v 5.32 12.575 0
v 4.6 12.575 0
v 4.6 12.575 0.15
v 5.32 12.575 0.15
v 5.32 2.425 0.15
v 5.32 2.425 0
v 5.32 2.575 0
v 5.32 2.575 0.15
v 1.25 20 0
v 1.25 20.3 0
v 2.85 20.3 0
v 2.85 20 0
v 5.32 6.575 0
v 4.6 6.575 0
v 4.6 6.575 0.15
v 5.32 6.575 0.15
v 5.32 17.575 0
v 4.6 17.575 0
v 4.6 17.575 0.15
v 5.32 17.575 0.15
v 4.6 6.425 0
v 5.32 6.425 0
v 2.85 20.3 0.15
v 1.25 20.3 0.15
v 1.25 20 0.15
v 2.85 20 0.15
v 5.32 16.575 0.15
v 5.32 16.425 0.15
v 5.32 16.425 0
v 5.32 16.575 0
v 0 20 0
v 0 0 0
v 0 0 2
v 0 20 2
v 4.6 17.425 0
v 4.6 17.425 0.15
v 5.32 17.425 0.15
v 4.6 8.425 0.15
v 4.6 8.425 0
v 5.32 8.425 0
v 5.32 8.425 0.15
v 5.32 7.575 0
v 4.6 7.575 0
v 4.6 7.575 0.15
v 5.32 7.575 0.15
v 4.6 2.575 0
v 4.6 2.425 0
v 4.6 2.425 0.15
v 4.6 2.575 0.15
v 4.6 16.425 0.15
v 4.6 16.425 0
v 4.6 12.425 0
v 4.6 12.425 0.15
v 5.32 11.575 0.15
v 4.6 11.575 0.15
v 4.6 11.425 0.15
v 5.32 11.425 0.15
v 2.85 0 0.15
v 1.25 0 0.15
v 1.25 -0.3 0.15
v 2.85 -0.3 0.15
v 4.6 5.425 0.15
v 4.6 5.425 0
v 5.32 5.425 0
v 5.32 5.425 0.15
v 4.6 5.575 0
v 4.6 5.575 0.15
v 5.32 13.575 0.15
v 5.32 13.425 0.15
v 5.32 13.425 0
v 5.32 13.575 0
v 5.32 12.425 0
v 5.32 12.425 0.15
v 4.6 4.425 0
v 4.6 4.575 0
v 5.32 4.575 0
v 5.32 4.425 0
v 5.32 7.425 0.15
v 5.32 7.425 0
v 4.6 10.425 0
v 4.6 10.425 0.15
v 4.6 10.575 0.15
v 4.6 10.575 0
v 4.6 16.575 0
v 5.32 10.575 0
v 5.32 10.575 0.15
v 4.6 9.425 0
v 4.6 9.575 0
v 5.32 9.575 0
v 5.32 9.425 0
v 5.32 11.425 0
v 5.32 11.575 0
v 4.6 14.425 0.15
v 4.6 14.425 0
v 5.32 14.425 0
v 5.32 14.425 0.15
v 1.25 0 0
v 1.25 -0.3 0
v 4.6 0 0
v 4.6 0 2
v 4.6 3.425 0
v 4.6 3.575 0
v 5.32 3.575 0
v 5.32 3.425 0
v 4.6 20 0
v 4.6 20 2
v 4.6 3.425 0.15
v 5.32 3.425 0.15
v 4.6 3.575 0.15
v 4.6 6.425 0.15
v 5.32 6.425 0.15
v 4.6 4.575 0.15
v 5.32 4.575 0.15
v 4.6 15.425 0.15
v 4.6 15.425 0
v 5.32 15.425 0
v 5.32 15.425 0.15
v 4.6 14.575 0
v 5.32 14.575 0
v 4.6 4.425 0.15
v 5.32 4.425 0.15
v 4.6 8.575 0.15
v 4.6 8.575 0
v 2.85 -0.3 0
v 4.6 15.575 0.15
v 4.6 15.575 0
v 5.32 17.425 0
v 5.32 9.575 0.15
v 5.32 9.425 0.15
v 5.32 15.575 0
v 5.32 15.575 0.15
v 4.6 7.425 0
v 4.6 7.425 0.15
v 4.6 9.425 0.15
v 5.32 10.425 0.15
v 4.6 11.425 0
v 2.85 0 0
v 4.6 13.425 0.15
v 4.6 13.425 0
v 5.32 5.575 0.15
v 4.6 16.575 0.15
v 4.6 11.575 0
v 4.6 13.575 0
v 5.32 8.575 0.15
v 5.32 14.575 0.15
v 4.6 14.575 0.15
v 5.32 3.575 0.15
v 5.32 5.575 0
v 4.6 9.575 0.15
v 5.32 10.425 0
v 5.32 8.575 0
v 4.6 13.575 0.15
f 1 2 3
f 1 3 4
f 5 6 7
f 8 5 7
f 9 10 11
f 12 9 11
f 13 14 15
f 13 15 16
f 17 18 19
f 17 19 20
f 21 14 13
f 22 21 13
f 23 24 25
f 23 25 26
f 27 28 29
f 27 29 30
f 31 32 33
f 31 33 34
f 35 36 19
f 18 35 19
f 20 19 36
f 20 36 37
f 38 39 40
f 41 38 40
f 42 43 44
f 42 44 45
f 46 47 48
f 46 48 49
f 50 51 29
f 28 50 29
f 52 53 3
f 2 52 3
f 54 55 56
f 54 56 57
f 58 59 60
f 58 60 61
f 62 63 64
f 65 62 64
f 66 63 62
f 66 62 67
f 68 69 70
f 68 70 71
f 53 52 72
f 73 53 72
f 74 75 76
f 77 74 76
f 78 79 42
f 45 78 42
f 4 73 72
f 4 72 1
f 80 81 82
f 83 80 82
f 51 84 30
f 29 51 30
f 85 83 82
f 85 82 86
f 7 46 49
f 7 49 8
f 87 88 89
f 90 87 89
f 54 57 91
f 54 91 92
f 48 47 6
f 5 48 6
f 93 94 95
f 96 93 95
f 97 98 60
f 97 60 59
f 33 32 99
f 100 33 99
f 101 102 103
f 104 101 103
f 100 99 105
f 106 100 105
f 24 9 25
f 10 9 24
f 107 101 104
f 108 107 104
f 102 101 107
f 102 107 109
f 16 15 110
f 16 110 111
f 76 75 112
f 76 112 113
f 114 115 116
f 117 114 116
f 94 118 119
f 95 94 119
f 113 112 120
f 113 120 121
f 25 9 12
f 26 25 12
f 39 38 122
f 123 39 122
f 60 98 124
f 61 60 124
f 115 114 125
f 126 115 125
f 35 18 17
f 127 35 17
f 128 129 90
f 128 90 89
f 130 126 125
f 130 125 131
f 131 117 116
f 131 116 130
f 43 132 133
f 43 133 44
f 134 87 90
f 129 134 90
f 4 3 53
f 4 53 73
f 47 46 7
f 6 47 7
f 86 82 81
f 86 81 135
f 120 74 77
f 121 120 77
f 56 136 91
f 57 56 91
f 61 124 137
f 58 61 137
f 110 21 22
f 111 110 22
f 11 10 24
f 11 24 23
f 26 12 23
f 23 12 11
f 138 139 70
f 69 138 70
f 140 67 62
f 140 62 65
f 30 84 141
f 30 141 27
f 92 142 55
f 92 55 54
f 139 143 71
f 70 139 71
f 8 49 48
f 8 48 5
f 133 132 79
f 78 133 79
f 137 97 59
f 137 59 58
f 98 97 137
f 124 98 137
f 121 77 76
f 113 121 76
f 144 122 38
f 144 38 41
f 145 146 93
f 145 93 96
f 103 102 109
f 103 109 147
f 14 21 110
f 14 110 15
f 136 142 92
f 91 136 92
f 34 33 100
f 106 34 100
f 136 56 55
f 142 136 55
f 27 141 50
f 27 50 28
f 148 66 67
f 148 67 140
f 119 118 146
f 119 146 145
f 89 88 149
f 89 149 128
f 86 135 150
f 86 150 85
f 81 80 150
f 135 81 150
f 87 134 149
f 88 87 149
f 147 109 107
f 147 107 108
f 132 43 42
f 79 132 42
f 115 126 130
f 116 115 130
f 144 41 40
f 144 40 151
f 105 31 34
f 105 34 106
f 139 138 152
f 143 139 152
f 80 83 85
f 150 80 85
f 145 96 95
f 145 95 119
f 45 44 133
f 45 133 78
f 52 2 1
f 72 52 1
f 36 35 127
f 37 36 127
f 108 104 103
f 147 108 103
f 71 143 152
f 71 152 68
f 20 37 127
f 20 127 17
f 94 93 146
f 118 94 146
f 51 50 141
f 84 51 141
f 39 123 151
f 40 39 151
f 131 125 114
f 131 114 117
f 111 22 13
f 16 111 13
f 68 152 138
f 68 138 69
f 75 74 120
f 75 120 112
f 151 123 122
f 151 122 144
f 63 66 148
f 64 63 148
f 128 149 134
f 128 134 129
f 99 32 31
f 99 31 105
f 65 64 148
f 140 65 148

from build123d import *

# Parameters (mm, degrees)
BOX_W        = 4.6
BOX_H        = 20
BOX_DEPTH    = 2
BOX001_W     = 0.72
BOX001_H     = 0.15
BOX001_DEPTH = 0.15
BOX002_W     = 0.72
BOX002_H     = 0.15
BOX002_DEPTH = 0.15
BOX003_W     = 0.72
BOX003_H     = 0.15
BOX003_DEPTH = 0.15
BOX004_W     = 0.72
BOX004_H     = 0.15
BOX004_DEPTH = 0.15
BOX005_W     = 0.72
BOX005_H     = 0.15
BOX005_DEPTH = 0.15
BOX006_W     = 0.72
BOX006_H     = 0.15
BOX006_DEPTH = 0.15
BOX007_W     = 0.72
BOX007_H     = 0.15
BOX007_DEPTH = 0.15
BOX008_W     = 0.72
BOX008_H     = 0.15
BOX008_DEPTH = 0.15
BOX009_W     = 0.72
BOX009_H     = 0.15
BOX009_DEPTH = 0.15
BOX010_W     = 0.72
BOX010_H     = 0.15
BOX010_DEPTH = 0.15
BOX011_W     = 0.72
BOX011_H     = 0.15
BOX011_DEPTH = 0.15
BOX012_W     = 0.72
BOX012_H     = 0.15
BOX012_DEPTH = 0.15
BOX013_W     = 0.72
BOX013_H     = 0.15
BOX013_DEPTH = 0.15
BOX014_W     = 0.72
BOX014_H     = 0.15
BOX014_DEPTH = 0.15
BOX015_W     = 0.72
BOX015_H     = 0.15
BOX015_DEPTH = 0.15
BOX016_W     = 0.72
BOX016_H     = 0.15
BOX016_DEPTH = 0.15
BOX017_W     = 1.6
BOX017_H     = 0.3
BOX017_DEPTH = 0.15
BOX018_W     = 1.6
BOX018_H     = 0.3
BOX018_DEPTH = 0.15


with BuildPart() as body:
    # Box → Box (new body)
    with BuildSketch(Plane.XY):
        with Locations((2.3, 10)):
            Rectangle(BOX_W, BOX_H)
    extrude(amount=BOX_DEPTH)


with BuildPart() as box001:
    # Box001 → Box001 (new body)
    with BuildSketch(Plane(origin=(4.6, 17.425, 0), x_dir=(1, 0, 0), z_dir=(0, 0, 1))):
        with Locations((0.36, 0.075)):
            Rectangle(BOX001_W, BOX001_H)
    extrude(amount=BOX001_DEPTH)


with BuildPart() as box002:
    # Box002 → Box002 (new body)
    with BuildSketch(Plane(origin=(4.6, 16.425, 0), x_dir=(1, 0, 0), z_dir=(0, 0, 1))):
        with Locations((0.36, 0.075)):
            Rectangle(BOX002_W, BOX002_H)
    extrude(amount=BOX002_DEPTH)


with BuildPart() as box003:
    # Box003 → Box003 (new body)
    with BuildSketch(Plane(origin=(4.6, 15.425, 0), x_dir=(1, 0, 0), z_dir=(0, 0, 1))):
        with Locations((0.36, 0.075)):
            Rectangle(BOX003_W, BOX003_H)
    extrude(amount=BOX003_DEPTH)


with BuildPart() as box004:
    # Box004 → Box004 (new body)
    with BuildSketch(Plane(origin=(4.6, 14.425, 0), x_dir=(1, 0, 0), z_dir=(0, 0, 1))):
        with Locations((0.36, 0.075)):
            Rectangle(BOX004_W, BOX004_H)
    extrude(amount=BOX004_DEPTH)


with BuildPart() as box005:
    # Box005 → Box005 (new body)
    with BuildSketch(Plane(origin=(4.6, 13.425, 0), x_dir=(1, 0, 0), z_dir=(0, 0, 1))):
        with Locations((0.36, 0.075)):
            Rectangle(BOX005_W, BOX005_H)
    extrude(amount=BOX005_DEPTH)


with BuildPart() as box006:
    # Box006 → Box006 (new body)
    with BuildSketch(Plane(origin=(4.6, 12.425, 0), x_dir=(1, 0, 0), z_dir=(0, 0, 1))):
        with Locations((0.36, 0.075)):
            Rectangle(BOX006_W, BOX006_H)
    extrude(amount=BOX006_DEPTH)


with BuildPart() as box007:
    # Box007 → Box007 (new body)
    with BuildSketch(Plane(origin=(4.6, 11.425, 0), x_dir=(1, 0, 0), z_dir=(0, 0, 1))):
        with Locations((0.36, 0.075)):
            Rectangle(BOX007_W, BOX007_H)
    extrude(amount=BOX007_DEPTH)


with BuildPart() as box008:
    # Box008 → Box008 (new body)
    with BuildSketch(Plane(origin=(4.6, 10.425, 0), x_dir=(1, 0, 0), z_dir=(0, 0, 1))):
        with Locations((0.36, 0.075)):
            Rectangle(BOX008_W, BOX008_H)
    extrude(amount=BOX008_DEPTH)


with BuildPart() as box009:
    # Box009 → Box009 (new body)
    with BuildSketch(Plane(origin=(4.6, 9.425, 0), x_dir=(1, 0, 0), z_dir=(0, 0, 1))):
        with Locations((0.36, 0.075)):
            Rectangle(BOX009_W, BOX009_H)
    extrude(amount=BOX009_DEPTH)


with BuildPart() as box010:
    # Box010 → Box010 (new body)
    with BuildSketch(Plane(origin=(4.6, 8.425, 0), x_dir=(1, 0, 0), z_dir=(0, 0, 1))):
        with Locations((0.36, 0.075)):
            Rectangle(BOX010_W, BOX010_H)
    extrude(amount=BOX010_DEPTH)


with BuildPart() as box011:
    # Box011 → Box011 (new body)
    with BuildSketch(Plane(origin=(4.6, 7.425, 0), x_dir=(1, 0, 0), z_dir=(0, 0, 1))):
        with Locations((0.36, 0.075)):
            Rectangle(BOX011_W, BOX011_H)
    extrude(amount=BOX011_DEPTH)


with BuildPart() as box012:
    # Box012 → Box012 (new body)
    with BuildSketch(Plane(origin=(4.6, 6.425, 0), x_dir=(1, 0, 0), z_dir=(0, 0, 1))):
        with Locations((0.36, 0.075)):
            Rectangle(BOX012_W, BOX012_H)
    extrude(amount=BOX012_DEPTH)


with BuildPart() as box013:
    # Box013 → Box013 (new body)
    with BuildSketch(Plane(origin=(4.6, 5.425, 0), x_dir=(1, 0, 0), z_dir=(0, 0, 1))):
        with Locations((0.36, 0.075)):
            Rectangle(BOX013_W, BOX013_H)
    extrude(amount=BOX013_DEPTH)


with BuildPart() as box014:
    # Box014 → Box014 (new body)
    with BuildSketch(Plane(origin=(4.6, 4.425, 0), x_dir=(1, 0, 0), z_dir=(0, 0, 1))):
        with Locations((0.36, 0.075)):
            Rectangle(BOX014_W, BOX014_H)
    extrude(amount=BOX014_DEPTH)


with BuildPart() as box015:
    # Box015 → Box015 (new body)
    with BuildSketch(Plane(origin=(4.6, 3.425, 0), x_dir=(1, 0, 0), z_dir=(0, 0, 1))):
        with Locations((0.36, 0.075)):
            Rectangle(BOX015_W, BOX015_H)
    extrude(amount=BOX015_DEPTH)


with BuildPart() as box016:
    # Box016 → Box016 (new body)
    with BuildSketch(Plane(origin=(4.6, 2.425, 0), x_dir=(1, 0, 0), z_dir=(0, 0, 1))):
        with Locations((0.36, 0.075)):
            Rectangle(BOX016_W, BOX016_H)
    extrude(amount=BOX016_DEPTH)


with BuildPart() as left_mounting:
    # Box017 → Box017 (new body)
    with BuildSketch(Plane(origin=(1.25, -0.3, 0), x_dir=(1, 0, 0), z_dir=(0, 0, 1))):
        with Locations((0.8, 0.15)):
            Rectangle(BOX017_W, BOX017_H)
    extrude(amount=BOX017_DEPTH)


with BuildPart() as right_mounting:
    # Box018 → Box018 (new body)
    with BuildSketch(Plane(origin=(1.25, 20, 0), x_dir=(1, 0, 0), z_dir=(0, 0, 1))):
        with Locations((0.8, 0.15)):
            Rectangle(BOX018_W, BOX018_H)
    extrude(amount=BOX018_DEPTH)


solid = Compound([body.part, box001.part, box002.part, box003.part, box004.part, box005.part, box006.part, box007.part, box008.part, box009.part, box010.part, box011.part, box012.part, box013.part, box014.part, box015.part, box016.part, left_mounting.part, right_mounting.part])
